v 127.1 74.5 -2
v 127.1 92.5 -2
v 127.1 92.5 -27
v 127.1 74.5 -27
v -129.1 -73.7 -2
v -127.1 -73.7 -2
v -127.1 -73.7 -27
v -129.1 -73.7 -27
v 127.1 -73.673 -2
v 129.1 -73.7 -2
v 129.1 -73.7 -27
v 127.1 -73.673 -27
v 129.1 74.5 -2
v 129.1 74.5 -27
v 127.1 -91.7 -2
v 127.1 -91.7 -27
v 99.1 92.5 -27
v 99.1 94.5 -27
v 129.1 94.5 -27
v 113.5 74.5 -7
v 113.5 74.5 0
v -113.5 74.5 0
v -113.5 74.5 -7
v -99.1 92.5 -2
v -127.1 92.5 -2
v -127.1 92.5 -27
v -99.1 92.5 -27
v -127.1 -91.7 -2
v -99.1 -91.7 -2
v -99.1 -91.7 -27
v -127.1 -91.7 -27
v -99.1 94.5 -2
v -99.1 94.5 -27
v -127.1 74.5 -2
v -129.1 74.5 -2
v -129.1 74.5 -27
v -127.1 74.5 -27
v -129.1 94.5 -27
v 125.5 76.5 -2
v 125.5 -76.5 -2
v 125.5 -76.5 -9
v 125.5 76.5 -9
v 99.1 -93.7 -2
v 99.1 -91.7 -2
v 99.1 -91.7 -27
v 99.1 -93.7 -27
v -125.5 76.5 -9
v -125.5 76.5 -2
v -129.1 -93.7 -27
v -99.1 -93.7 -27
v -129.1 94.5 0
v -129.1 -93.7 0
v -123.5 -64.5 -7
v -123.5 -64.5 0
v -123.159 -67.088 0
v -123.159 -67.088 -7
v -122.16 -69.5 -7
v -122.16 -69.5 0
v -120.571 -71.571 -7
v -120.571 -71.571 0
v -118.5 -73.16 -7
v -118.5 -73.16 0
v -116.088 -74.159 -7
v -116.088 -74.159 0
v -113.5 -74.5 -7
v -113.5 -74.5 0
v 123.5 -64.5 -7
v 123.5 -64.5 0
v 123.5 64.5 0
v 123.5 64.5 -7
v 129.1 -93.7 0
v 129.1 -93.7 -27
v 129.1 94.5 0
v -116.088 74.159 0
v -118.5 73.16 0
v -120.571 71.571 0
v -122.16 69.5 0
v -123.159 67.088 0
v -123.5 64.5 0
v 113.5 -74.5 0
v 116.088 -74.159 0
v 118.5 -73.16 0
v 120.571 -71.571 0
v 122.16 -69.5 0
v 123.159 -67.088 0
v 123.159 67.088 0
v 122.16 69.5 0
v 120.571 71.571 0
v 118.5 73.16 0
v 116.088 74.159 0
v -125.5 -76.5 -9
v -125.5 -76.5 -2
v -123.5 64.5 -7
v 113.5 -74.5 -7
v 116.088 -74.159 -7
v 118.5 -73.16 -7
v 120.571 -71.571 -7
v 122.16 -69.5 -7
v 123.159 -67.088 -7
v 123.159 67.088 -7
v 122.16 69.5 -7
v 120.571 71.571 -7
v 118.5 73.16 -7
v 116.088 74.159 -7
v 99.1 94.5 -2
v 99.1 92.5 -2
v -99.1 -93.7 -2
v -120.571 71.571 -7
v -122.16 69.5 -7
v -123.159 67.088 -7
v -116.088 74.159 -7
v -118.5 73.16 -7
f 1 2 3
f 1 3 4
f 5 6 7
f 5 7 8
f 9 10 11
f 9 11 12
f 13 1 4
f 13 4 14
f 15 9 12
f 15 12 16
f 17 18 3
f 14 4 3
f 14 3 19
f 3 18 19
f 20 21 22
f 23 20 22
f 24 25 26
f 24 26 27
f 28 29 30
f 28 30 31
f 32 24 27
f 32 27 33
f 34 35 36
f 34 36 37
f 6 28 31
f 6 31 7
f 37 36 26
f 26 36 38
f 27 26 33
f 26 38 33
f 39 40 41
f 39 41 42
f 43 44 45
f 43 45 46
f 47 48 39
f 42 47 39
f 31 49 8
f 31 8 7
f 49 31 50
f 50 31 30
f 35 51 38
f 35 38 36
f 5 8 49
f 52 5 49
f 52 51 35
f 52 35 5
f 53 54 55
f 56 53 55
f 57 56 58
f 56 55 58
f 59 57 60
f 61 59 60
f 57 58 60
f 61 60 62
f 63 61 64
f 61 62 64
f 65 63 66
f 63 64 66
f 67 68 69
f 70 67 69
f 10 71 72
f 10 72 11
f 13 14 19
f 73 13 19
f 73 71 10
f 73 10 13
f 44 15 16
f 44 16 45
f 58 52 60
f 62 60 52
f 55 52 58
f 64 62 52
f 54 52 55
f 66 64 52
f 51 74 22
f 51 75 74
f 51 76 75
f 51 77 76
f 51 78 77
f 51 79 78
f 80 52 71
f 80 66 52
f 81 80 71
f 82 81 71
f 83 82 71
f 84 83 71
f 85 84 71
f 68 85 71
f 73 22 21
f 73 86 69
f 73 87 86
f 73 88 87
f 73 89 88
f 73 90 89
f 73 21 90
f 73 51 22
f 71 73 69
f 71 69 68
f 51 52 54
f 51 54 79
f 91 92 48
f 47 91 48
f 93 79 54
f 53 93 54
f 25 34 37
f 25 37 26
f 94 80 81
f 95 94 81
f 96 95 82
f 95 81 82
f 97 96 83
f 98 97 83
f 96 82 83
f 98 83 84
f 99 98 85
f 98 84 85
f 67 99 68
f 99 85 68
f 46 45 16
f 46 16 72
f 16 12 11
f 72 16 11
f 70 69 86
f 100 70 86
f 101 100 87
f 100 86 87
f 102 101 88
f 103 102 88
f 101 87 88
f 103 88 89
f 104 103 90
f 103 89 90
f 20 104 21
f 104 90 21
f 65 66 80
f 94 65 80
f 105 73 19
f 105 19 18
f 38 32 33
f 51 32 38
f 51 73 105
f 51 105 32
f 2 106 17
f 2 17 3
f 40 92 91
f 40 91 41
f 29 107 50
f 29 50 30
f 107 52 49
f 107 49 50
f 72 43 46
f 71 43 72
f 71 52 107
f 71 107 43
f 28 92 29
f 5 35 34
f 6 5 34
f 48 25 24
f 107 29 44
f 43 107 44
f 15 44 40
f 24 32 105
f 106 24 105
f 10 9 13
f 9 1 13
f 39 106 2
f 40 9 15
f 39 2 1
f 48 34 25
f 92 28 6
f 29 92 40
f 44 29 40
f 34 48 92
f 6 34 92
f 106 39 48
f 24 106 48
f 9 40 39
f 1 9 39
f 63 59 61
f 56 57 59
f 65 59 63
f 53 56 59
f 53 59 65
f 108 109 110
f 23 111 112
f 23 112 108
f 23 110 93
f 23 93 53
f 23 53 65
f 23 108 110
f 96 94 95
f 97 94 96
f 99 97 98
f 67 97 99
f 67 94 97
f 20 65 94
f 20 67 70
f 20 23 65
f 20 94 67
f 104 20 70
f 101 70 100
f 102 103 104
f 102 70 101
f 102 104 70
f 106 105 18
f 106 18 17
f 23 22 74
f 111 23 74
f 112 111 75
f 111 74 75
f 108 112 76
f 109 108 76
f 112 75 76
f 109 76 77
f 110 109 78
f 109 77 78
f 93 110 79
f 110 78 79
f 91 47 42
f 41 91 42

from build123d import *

# Parameters (mm, degrees)
F1_DEPTH = 27
F0_W     = 251
F0_H     = 153
F2_DEPTH = 2
F0_W_2   = 198.2
F0_H_2   = 2
F0_W_3   = 2
F0_H_3   = 148.2
F3_DEPTH = 2
F4_DEPTH = 9
F5_DEPTH = 7


with BuildPart() as f1:
    # F0 (on Top) → F1 (new body)
    with BuildSketch(Plane.XY):
        Polygon((99.1, 94.5), (99.1, 92.5), (127.1, 92.5), (127.1, 74.5), (129.1, 74.5), (129.1, 94.5), align=None)
        Polygon((129.1, -73.7), (127.1, -73.673005), (127.1, -91.7), (99.1, -91.7), (99.1, -93.7), (129.1, -93.7), align=None)
        Polygon((-127.1, -91.7), (-127.1, -73.7), (-129.1, -73.7), (-129.1, -93.7), (-99.1, -93.7), (-99.1, -91.7), align=None)
        Polygon((-127.1, 74.5), (-127.1, 92.5), (-99.1, 92.5), (-99.1, 94.5), (-129.1, 94.5), (-129.1, 74.5), align=None)
    extrude(amount=-F1_DEPTH)

    # F0 (on Top) → F2 (join)
    with BuildSketch(Plane.XY):
        Polygon((-99.1, 92.5), (-127.1, 92.5), (-127.1, 74.5), (-127.1, -73.7), (-127.1, -91.7), (-99.1, -91.7), (99.1, -91.7), (127.1, -91.7), (127.1, -73.673005), (127.1, 74.5), (127.1, 92.5), (99.1, 92.5), align=None)
        Rectangle(F0_W, F0_H, mode=Mode.SUBTRACT)
        Rectangle(F0_W, F0_H)
        with BuildLine():
            ThreePointArc((-123.5, 64.5), (-120.571068, 71.571068), (-113.5, 74.5))
            Line((-113.5, 74.5), (113.5, 74.5))
            ThreePointArc((113.5, 74.5), (120.571068, 71.571068), (123.5, 64.5))
            Line((123.5, 64.5), (123.5, -64.5))
            ThreePointArc((123.5, -64.5), (120.571068, -71.571068), (113.5, -74.5))
            Line((113.5, -74.5), (-113.5, -74.5))
            ThreePointArc((-113.5, -74.5), (-120.571068, -71.571068), (-123.5, -64.5))
            Line((-123.5, -64.5), (-123.5, 64.5))
        make_face(mode=Mode.SUBTRACT)
    extrude(amount=-F2_DEPTH)

    # F0 (on Top) → F3 (join)
    with BuildSketch(Plane.XY):
        with Locations((0, -92.7)):
            Rectangle(F0_W_2, F0_H_2)
        with Locations((0, 93.5)):
            Rectangle(F0_W_2, F0_H_2)
        with Locations((-128.1, 0.4)):
            Rectangle(F0_W_3, F0_H_3)
        Polygon((129.1, 74.5), (127.1, 74.5), (127.1, -73.673005), (129.1, -73.7), align=None)
    extrude(amount=-F3_DEPTH)

    # F0 (on Top) → F4 (join)
    with BuildSketch(Plane.XY):
        Rectangle(F0_W, F0_H)
        with BuildLine():
            ThreePointArc((-123.5, 64.5), (-120.571068, 71.571068), (-113.5, 74.5))
            Line((-113.5, 74.5), (113.5, 74.5))
            ThreePointArc((113.5, 74.5), (120.571068, 71.571068), (123.5, 64.5))
            Line((123.5, 64.5), (123.5, -64.5))
            ThreePointArc((123.5, -64.5), (120.571068, -71.571068), (113.5, -74.5))
            Line((113.5, -74.5), (-113.5, -74.5))
            ThreePointArc((-113.5, -74.5), (-120.571068, -71.571068), (-123.5, -64.5))
            Line((-123.5, -64.5), (-123.5, 64.5))
        make_face(mode=Mode.SUBTRACT)
        with BuildLine():
            Line((113.5, 74.5), (-113.5, 74.5))
            ThreePointArc((-113.5, 74.5), (-120.571068, 71.571068), (-123.5, 64.5))
            Line((-123.5, 64.5), (-123.5, -64.5))
            ThreePointArc((-123.5, -64.5), (-120.571068, -71.571068), (-113.5, -74.5))
            Line((-113.5, -74.5), (113.5, -74.5))
            ThreePointArc((113.5, -74.5), (120.571068, -71.571068), (123.5, -64.5))
            Line((123.5, -64.5), (123.5, 64.5))
            ThreePointArc((123.5, 64.5), (120.571068, 71.571068), (113.5, 74.5))
        make_face()
    extrude(amount=-F4_DEPTH)

    # F0 (on Top) → F5 (cut)
    with BuildSketch(Plane.XY):
        with BuildLine():
            Line((113.5, 74.5), (-113.5, 74.5))
            ThreePointArc((-113.5, 74.5), (-120.571068, 71.571068), (-123.5, 64.5))
            Line((-123.5, 64.5), (-123.5, -64.5))
            ThreePointArc((-123.5, -64.5), (-120.571068, -71.571068), (-113.5, -74.5))
            Line((-113.5, -74.5), (113.5, -74.5))
            ThreePointArc((113.5, -74.5), (120.571068, -71.571068), (123.5, -64.5))
            Line((123.5, -64.5), (123.5, 64.5))
            ThreePointArc((123.5, 64.5), (120.571068, 71.571068), (113.5, 74.5))
        make_face()
    extrude(amount=-F5_DEPTH, mode=Mode.SUBTRACT)


solid = f1.part
